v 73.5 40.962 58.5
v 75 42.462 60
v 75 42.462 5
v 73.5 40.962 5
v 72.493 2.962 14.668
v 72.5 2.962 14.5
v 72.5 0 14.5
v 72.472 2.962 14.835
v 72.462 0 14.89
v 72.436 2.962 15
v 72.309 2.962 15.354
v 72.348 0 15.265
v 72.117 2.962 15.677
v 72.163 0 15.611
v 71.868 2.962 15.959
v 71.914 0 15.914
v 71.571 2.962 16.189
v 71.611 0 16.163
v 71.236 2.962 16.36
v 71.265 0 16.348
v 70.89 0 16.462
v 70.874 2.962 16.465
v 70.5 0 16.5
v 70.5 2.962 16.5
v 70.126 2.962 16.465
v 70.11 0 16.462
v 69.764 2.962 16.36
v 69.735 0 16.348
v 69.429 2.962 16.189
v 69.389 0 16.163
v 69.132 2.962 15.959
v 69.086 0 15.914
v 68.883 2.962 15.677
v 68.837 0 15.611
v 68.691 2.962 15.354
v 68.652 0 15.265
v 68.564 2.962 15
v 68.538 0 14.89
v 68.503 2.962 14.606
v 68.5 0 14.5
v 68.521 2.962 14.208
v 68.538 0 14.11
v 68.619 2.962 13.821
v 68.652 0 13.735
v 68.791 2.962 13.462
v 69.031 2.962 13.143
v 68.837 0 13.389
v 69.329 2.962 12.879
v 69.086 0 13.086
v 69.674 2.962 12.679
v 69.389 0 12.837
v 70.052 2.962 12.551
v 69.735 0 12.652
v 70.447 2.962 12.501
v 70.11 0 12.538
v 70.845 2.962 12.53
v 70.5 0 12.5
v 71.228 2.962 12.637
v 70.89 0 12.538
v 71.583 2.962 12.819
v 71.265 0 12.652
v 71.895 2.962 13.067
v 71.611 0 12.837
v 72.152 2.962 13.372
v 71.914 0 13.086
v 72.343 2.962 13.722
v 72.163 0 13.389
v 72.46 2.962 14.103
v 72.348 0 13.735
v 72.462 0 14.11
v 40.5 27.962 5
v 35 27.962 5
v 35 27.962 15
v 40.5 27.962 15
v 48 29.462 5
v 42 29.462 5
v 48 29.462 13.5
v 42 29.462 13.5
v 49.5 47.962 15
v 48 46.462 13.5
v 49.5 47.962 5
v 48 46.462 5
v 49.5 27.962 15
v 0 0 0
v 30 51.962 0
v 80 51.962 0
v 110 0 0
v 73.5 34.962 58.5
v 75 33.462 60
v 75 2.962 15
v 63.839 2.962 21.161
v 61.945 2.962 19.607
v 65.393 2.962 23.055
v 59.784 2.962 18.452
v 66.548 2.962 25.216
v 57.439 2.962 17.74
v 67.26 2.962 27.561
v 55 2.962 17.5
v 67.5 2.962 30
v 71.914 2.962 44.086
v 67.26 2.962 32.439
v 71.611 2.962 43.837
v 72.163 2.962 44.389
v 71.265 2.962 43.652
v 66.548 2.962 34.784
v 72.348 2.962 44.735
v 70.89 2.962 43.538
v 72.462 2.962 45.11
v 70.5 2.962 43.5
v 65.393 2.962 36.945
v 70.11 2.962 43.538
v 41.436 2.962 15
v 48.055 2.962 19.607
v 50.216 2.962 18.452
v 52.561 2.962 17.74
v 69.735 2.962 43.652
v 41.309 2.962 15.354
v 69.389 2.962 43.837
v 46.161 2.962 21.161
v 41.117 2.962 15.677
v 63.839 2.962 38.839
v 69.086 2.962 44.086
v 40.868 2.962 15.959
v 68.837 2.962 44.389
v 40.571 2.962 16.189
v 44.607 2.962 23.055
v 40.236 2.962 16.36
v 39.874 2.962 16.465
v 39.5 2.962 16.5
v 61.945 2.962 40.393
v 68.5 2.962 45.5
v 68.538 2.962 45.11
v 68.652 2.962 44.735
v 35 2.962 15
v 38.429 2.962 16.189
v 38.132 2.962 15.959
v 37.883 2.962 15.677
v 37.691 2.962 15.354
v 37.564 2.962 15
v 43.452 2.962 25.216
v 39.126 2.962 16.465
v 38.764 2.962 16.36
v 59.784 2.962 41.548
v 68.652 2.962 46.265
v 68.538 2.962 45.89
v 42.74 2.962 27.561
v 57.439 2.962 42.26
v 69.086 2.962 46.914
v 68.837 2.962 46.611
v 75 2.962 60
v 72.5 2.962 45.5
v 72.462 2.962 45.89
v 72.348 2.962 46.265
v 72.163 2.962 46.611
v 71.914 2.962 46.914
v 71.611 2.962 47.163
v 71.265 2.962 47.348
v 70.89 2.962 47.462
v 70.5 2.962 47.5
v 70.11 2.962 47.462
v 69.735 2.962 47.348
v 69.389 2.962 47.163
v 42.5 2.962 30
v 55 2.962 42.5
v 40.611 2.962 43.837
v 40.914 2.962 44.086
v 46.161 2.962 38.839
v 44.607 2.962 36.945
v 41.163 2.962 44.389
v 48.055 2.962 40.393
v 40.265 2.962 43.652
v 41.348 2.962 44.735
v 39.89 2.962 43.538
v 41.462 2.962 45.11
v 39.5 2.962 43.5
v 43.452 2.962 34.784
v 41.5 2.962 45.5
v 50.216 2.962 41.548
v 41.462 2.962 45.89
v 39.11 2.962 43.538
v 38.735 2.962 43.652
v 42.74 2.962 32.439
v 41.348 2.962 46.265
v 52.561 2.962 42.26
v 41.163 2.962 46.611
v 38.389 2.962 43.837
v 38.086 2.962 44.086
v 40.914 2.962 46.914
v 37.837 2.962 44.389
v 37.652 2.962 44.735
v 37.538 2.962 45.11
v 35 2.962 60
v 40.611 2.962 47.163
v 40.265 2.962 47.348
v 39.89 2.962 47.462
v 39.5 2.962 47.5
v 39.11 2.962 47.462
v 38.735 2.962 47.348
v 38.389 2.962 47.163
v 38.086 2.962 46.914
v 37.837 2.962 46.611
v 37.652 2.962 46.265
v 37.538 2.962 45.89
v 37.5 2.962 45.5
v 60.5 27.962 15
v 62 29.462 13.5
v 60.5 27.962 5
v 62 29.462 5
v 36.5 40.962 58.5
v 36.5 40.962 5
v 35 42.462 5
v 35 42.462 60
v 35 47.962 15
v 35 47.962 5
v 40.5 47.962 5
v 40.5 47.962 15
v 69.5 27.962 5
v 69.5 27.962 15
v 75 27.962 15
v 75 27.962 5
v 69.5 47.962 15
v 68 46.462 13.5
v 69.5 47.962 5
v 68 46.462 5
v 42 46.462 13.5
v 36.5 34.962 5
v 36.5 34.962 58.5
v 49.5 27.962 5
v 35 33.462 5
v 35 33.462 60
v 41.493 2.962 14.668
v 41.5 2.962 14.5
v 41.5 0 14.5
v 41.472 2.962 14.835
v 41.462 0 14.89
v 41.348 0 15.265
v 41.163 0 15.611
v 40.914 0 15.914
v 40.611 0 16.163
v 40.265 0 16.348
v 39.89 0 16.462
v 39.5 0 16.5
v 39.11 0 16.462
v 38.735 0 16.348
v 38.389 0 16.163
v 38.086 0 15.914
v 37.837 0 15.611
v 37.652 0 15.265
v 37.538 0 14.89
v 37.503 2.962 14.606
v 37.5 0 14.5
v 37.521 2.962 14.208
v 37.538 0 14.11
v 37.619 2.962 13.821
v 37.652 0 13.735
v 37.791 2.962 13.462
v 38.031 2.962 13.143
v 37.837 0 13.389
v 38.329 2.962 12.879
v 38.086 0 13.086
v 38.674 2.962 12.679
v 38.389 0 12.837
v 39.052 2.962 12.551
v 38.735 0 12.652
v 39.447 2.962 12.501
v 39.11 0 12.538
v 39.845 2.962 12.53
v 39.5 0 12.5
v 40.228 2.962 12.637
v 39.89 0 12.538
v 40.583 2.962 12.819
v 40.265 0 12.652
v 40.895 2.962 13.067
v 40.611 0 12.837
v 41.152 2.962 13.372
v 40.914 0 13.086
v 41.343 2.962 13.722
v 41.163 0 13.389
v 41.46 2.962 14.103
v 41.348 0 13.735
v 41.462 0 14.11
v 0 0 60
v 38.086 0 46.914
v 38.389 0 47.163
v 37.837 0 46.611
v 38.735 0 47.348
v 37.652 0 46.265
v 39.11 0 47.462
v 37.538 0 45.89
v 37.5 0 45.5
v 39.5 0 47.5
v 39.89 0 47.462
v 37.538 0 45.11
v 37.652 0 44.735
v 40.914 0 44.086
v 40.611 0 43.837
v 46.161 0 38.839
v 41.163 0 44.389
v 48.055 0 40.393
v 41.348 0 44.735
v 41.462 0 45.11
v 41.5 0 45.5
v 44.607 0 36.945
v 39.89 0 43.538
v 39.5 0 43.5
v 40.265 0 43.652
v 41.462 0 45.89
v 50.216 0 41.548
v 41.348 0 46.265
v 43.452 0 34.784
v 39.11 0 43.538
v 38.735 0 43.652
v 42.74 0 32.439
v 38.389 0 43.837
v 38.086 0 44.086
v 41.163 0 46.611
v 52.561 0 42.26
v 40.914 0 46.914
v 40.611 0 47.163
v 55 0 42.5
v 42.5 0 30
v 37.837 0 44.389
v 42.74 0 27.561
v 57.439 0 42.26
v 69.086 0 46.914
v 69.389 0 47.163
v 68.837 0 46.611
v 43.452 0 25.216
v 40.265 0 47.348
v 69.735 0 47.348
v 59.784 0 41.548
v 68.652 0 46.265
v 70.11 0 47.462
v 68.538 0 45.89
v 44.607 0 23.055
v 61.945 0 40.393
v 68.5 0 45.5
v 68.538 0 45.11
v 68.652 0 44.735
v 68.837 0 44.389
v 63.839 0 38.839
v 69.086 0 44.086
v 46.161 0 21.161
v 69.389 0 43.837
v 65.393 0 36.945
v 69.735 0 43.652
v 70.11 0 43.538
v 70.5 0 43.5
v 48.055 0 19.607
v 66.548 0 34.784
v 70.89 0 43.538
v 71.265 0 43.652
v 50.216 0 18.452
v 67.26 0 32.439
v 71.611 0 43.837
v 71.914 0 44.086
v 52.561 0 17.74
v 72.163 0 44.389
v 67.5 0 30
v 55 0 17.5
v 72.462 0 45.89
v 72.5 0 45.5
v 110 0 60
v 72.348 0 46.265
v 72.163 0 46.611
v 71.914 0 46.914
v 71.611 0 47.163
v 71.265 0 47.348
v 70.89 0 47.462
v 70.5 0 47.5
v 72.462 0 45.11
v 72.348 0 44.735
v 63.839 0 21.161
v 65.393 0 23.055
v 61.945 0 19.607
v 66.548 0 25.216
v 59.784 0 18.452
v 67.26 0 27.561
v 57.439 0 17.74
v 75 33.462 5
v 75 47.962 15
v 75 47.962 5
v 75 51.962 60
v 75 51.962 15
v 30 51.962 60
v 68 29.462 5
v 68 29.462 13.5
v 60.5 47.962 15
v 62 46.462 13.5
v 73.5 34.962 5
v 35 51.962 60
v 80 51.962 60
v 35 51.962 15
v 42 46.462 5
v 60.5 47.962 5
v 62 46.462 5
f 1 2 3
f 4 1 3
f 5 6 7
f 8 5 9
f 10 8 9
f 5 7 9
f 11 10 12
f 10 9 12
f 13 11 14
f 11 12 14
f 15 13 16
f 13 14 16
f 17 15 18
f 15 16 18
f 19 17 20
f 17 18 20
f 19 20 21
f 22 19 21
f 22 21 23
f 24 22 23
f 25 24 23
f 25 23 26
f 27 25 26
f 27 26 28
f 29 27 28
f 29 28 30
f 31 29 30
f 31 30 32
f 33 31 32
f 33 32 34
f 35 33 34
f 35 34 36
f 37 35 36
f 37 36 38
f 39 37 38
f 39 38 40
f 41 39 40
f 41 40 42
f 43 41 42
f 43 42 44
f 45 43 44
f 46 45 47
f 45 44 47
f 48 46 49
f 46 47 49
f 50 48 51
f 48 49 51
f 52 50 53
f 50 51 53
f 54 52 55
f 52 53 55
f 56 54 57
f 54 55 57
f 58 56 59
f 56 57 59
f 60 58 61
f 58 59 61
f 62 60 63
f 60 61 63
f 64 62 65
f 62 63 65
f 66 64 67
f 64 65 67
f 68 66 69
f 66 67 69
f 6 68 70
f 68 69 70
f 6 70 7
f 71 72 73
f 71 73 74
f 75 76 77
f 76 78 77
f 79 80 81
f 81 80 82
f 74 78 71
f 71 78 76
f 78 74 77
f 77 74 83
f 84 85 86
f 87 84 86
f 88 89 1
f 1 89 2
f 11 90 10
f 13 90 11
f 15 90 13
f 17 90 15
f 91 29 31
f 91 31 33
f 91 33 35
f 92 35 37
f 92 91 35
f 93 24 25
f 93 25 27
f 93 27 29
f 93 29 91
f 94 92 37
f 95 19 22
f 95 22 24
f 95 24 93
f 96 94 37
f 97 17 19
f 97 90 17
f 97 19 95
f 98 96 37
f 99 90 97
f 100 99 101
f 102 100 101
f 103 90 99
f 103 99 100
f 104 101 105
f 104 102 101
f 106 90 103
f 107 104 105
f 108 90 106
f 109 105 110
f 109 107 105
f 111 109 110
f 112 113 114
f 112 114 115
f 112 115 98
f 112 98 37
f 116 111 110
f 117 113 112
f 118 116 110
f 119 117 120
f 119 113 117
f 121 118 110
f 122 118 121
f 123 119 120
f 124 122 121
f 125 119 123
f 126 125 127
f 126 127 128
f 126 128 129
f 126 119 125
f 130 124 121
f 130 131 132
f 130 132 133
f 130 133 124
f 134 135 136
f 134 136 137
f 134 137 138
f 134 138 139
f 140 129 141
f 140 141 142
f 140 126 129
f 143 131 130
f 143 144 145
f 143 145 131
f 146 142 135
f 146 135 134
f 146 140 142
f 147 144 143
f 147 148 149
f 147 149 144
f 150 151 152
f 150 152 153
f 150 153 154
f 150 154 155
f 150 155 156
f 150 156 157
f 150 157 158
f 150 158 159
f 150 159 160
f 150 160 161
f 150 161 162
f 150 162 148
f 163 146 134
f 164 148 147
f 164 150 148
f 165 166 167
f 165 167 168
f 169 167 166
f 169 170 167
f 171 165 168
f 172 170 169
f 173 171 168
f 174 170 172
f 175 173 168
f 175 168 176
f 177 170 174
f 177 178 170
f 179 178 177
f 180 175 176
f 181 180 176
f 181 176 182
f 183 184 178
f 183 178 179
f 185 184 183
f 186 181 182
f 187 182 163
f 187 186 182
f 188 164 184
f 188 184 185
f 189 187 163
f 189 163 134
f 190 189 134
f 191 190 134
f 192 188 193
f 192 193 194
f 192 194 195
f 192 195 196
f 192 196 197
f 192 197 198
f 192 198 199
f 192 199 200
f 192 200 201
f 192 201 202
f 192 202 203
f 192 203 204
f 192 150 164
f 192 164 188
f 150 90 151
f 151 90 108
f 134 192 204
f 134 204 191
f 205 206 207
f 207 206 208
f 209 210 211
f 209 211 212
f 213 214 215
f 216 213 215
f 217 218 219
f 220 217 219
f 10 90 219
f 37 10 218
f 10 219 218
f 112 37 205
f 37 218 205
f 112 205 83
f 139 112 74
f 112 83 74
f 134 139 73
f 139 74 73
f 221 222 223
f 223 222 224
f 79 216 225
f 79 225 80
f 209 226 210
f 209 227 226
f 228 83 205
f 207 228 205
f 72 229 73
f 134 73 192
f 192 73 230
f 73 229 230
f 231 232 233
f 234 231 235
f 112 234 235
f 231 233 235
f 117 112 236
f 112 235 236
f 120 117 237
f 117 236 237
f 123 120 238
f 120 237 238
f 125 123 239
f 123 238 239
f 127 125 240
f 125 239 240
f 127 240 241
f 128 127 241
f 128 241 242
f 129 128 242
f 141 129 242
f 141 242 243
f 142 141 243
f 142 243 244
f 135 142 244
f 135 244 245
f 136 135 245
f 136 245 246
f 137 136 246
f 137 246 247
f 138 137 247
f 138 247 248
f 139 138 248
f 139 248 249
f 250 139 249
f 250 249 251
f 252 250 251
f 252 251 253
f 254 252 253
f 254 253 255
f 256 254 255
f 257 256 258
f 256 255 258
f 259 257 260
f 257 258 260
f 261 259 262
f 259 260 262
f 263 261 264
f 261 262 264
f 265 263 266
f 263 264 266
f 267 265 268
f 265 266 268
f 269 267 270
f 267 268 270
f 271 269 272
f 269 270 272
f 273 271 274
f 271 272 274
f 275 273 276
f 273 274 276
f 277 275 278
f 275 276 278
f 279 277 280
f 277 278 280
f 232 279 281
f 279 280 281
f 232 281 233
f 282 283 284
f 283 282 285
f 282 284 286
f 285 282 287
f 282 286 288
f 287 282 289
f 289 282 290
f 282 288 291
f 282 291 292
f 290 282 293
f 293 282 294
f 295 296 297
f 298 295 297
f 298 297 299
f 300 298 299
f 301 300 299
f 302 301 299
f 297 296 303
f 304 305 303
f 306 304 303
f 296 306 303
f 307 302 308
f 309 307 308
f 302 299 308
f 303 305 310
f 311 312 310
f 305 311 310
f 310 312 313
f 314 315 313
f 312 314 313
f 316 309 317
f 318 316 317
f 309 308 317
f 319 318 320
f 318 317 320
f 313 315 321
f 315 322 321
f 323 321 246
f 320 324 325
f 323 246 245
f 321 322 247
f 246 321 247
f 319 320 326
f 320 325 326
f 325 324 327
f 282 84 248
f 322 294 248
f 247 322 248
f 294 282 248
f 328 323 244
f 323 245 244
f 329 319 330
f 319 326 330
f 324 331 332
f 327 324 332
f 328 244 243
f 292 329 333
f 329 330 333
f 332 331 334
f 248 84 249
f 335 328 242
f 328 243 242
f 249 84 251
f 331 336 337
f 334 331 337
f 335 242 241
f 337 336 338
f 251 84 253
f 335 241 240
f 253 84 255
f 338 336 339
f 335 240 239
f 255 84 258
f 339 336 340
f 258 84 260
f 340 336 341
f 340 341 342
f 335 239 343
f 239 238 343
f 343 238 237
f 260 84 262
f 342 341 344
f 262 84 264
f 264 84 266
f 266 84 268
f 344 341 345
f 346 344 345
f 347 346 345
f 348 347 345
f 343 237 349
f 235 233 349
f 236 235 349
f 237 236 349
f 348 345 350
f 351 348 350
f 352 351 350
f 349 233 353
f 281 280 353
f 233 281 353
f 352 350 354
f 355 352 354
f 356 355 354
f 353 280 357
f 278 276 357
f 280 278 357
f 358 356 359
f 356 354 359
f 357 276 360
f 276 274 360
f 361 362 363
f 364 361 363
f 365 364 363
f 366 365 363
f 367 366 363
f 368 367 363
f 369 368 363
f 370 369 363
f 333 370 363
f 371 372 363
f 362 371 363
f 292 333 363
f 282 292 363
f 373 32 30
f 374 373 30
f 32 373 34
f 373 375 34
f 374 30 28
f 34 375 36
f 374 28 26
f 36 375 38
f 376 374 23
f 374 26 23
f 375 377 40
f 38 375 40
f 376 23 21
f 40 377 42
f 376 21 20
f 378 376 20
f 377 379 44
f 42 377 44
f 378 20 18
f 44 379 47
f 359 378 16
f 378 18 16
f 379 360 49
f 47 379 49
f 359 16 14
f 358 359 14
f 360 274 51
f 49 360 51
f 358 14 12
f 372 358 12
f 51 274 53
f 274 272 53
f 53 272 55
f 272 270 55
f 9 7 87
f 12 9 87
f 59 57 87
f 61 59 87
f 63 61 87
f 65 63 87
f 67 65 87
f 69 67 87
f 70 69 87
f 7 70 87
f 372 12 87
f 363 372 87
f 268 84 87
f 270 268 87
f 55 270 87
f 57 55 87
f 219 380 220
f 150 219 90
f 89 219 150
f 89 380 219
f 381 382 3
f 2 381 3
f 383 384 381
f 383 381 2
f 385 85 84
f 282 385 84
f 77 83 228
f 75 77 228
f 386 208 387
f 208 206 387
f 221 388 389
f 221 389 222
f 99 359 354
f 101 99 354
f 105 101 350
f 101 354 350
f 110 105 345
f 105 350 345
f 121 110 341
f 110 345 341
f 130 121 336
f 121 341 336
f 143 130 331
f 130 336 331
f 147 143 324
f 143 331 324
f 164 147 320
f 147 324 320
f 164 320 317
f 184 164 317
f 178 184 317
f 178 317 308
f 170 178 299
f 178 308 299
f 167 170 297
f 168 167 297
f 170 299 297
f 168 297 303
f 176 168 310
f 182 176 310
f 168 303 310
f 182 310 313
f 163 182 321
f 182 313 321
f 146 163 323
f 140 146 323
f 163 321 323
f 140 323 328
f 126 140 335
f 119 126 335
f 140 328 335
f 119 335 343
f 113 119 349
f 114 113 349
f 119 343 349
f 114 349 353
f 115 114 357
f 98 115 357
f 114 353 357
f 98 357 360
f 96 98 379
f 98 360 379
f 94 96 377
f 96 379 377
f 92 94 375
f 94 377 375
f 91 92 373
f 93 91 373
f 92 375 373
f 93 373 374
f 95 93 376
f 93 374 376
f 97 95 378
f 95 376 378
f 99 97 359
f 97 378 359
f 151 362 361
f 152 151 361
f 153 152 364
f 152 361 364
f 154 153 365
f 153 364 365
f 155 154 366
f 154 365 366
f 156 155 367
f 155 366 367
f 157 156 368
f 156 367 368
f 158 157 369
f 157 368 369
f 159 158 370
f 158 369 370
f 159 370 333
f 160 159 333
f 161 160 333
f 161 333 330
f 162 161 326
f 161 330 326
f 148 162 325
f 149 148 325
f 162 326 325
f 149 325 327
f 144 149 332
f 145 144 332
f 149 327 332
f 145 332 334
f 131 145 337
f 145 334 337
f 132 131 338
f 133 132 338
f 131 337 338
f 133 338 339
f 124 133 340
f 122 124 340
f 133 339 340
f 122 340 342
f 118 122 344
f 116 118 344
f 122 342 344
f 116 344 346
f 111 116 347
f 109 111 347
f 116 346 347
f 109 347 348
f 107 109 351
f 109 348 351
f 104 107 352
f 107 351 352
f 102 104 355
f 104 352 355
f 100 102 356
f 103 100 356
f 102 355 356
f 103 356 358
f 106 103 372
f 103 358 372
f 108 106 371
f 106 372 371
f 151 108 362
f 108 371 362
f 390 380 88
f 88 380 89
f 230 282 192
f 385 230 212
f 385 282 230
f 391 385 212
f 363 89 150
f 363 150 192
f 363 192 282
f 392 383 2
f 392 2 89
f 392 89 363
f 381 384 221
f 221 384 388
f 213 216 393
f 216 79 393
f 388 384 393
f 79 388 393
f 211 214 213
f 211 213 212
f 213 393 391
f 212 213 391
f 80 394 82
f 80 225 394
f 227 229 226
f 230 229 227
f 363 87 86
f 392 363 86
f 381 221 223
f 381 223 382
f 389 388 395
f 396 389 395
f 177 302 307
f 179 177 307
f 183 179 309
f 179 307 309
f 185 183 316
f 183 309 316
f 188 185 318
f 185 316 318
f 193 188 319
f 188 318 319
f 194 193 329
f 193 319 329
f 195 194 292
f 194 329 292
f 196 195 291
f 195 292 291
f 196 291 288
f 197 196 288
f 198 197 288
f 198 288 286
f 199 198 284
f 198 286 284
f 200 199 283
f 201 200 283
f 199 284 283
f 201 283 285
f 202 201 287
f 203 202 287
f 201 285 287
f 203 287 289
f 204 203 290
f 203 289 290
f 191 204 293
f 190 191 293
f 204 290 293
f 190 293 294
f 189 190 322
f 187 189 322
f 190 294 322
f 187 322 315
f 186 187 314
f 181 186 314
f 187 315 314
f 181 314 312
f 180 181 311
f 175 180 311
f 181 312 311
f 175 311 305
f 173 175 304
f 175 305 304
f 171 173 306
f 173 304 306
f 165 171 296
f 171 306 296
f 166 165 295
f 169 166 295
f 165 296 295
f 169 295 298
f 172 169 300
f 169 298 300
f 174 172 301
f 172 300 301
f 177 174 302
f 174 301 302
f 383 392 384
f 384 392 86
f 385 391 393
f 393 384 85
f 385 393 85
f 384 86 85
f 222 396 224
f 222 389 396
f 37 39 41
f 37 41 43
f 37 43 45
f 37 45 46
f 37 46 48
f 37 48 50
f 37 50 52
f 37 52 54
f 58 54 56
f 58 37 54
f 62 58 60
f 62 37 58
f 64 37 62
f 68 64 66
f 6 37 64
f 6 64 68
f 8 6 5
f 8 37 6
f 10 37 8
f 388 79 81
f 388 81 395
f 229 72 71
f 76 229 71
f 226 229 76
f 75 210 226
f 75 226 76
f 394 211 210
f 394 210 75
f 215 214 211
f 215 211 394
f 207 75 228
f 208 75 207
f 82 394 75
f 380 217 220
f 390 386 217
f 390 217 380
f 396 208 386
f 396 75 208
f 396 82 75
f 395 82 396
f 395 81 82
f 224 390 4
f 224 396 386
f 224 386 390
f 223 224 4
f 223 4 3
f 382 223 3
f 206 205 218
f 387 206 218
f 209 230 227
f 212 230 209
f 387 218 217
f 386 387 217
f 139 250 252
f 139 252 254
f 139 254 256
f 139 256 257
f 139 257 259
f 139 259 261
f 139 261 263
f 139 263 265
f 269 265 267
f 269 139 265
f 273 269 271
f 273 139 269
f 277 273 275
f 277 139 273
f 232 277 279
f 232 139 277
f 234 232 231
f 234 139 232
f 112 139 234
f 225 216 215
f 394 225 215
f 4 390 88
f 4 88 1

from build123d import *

# Parameters (mm, degrees)
F1_DEPTH  = 60
F2_W      = 40
F2_H      = 20
F3_DEPTH  = 55
F4_W      = 40
F4_H      = 45
F5_DEPTH  = 4
F6_W      = 40
F6_H      = 45
F7_DEPTH  = 25
F8_R      = 12.5
F8_R_2    = 2
F9_DEPTH  = 2.9615242271
F10_W     = 9
F10_H     = 1.5
F10_W_2   = 1.5
F10_H_2   = 9
F11_DEPTH = 10
F12_DEPTH = 45
F13_SIZE  = 1.49999


# Not quite as in the source:
# - a fillet or chamfer is up to 0.001 mm smaller than in the source, because OpenCascade refuses the exact size


with BuildPart() as f1:
    # F0 (on Top) → F1 (new body)
    with BuildSketch(Plane.XY):
        Polygon((30, 51.9615242271), (0, 0), (110, 0), (80, 51.9615242271), align=None)
    extrude(amount=F1_DEPTH)

    # F2 (on face) → F3 (cut)
    with BuildSketch(Plane.XY.offset(60)):
        with Locations((55, 37.9615242271)):
            Rectangle(F2_W, F2_H)
    extrude(amount=-F3_DEPTH, mode=Mode.SUBTRACT)

    # F4 (on face) → F5 (cut, through all)
    with BuildSketch(Plane(origin=(0, 51.9615242271, 0), x_dir=(-1, 0, 0), z_dir=(0, 1, 0))):
        with Locations((-55, 37.5)):
            Rectangle(F4_W, F4_H)
    extrude(amount=-F5_DEPTH, mode=Mode.SUBTRACT)

    # F6 (on face) → F7 (cut)
    with BuildSketch(Plane(origin=(0, 27.9615242271, 0), x_dir=(-1, 0, 0), z_dir=(0, 1, 0))):
        with Locations((-55, 37.5)):
            Rectangle(F6_W, F6_H)
    extrude(amount=-F7_DEPTH, mode=Mode.SUBTRACT)

    # F8 (on face) → F9 (cut, through all)
    with BuildSketch(Plane.XZ):
        with Locations((55, 30)):
            Circle(F8_R)
        with Locations((70.5, 45.5)):
            Circle(F8_R_2)
        with Locations((39.5, 45.5)):
            Circle(F8_R_2)
        with Locations((39.5, 14.5)):
            Circle(F8_R_2)
        with Locations((70.5, 14.5)):
            Circle(F8_R_2)
    extrude(amount=-F9_DEPTH, mode=Mode.SUBTRACT)

    # F10 (on face) → F11 (join, through all)
    with BuildSketch(Plane.XY.offset(15)):
        with Locations((45, 47.2115242271)):
            Rectangle(F10_W, F10_H)
        with Locations((65, 47.2115242271)):
            Rectangle(F10_W, F10_H)
        with Locations((45, 28.7115242271)):
            Rectangle(F10_W, F10_H)
        with Locations((65, 28.7115242271)):
            Rectangle(F10_W, F10_H)
        with Locations((35.75, 37.9615242271)):
            Rectangle(F10_W_2, F10_H_2)
        with Locations((74.25, 37.9615242271)):
            Rectangle(F10_W_2, F10_H_2)
    extrude(amount=-F11_DEPTH)

    # F12 (add, through all): faces of the model
    f12_faces = [f1.faces().sort_by_distance(p)[0] for p in [
        (74.25, 37.9615242271, 15),
        (35.75, 37.9615242271, 15),
    ]]
    extrude(f12_faces, amount=F12_DEPTH)

    # F13 (size 1.5 in the source; OpenCascade refuses exactly that, so slightly less here)
    f13_edges = [f1.edges().sort_by_distance(p)[0] for p in [
        (36.5, 33.461524, 32.5),
        (73.5, 37.961524, 60),
        (73.5, 42.461524, 32.5),
        (36.5, 37.961524, 60),
        (36.5, 42.461524, 32.5),
        (73.5, 33.461524, 32.5),
        (65, 29.461524, 15),
        (69.5, 29.461524, 10),
        (60.5, 29.461524, 10),
        (49.5, 29.461524, 10),
        (45, 29.461524, 15),
        (40.5, 46.461524, 10),
        (45, 46.461524, 15),
        (60.5, 46.461524, 10),
        (65, 46.461524, 15),
        (49.5, 46.461524, 10),
        (40.5, 29.461524, 10),
        (69.5, 46.461524, 10),
    ]]
    chamfer(f13_edges, length=F13_SIZE)


solid = f1.part
